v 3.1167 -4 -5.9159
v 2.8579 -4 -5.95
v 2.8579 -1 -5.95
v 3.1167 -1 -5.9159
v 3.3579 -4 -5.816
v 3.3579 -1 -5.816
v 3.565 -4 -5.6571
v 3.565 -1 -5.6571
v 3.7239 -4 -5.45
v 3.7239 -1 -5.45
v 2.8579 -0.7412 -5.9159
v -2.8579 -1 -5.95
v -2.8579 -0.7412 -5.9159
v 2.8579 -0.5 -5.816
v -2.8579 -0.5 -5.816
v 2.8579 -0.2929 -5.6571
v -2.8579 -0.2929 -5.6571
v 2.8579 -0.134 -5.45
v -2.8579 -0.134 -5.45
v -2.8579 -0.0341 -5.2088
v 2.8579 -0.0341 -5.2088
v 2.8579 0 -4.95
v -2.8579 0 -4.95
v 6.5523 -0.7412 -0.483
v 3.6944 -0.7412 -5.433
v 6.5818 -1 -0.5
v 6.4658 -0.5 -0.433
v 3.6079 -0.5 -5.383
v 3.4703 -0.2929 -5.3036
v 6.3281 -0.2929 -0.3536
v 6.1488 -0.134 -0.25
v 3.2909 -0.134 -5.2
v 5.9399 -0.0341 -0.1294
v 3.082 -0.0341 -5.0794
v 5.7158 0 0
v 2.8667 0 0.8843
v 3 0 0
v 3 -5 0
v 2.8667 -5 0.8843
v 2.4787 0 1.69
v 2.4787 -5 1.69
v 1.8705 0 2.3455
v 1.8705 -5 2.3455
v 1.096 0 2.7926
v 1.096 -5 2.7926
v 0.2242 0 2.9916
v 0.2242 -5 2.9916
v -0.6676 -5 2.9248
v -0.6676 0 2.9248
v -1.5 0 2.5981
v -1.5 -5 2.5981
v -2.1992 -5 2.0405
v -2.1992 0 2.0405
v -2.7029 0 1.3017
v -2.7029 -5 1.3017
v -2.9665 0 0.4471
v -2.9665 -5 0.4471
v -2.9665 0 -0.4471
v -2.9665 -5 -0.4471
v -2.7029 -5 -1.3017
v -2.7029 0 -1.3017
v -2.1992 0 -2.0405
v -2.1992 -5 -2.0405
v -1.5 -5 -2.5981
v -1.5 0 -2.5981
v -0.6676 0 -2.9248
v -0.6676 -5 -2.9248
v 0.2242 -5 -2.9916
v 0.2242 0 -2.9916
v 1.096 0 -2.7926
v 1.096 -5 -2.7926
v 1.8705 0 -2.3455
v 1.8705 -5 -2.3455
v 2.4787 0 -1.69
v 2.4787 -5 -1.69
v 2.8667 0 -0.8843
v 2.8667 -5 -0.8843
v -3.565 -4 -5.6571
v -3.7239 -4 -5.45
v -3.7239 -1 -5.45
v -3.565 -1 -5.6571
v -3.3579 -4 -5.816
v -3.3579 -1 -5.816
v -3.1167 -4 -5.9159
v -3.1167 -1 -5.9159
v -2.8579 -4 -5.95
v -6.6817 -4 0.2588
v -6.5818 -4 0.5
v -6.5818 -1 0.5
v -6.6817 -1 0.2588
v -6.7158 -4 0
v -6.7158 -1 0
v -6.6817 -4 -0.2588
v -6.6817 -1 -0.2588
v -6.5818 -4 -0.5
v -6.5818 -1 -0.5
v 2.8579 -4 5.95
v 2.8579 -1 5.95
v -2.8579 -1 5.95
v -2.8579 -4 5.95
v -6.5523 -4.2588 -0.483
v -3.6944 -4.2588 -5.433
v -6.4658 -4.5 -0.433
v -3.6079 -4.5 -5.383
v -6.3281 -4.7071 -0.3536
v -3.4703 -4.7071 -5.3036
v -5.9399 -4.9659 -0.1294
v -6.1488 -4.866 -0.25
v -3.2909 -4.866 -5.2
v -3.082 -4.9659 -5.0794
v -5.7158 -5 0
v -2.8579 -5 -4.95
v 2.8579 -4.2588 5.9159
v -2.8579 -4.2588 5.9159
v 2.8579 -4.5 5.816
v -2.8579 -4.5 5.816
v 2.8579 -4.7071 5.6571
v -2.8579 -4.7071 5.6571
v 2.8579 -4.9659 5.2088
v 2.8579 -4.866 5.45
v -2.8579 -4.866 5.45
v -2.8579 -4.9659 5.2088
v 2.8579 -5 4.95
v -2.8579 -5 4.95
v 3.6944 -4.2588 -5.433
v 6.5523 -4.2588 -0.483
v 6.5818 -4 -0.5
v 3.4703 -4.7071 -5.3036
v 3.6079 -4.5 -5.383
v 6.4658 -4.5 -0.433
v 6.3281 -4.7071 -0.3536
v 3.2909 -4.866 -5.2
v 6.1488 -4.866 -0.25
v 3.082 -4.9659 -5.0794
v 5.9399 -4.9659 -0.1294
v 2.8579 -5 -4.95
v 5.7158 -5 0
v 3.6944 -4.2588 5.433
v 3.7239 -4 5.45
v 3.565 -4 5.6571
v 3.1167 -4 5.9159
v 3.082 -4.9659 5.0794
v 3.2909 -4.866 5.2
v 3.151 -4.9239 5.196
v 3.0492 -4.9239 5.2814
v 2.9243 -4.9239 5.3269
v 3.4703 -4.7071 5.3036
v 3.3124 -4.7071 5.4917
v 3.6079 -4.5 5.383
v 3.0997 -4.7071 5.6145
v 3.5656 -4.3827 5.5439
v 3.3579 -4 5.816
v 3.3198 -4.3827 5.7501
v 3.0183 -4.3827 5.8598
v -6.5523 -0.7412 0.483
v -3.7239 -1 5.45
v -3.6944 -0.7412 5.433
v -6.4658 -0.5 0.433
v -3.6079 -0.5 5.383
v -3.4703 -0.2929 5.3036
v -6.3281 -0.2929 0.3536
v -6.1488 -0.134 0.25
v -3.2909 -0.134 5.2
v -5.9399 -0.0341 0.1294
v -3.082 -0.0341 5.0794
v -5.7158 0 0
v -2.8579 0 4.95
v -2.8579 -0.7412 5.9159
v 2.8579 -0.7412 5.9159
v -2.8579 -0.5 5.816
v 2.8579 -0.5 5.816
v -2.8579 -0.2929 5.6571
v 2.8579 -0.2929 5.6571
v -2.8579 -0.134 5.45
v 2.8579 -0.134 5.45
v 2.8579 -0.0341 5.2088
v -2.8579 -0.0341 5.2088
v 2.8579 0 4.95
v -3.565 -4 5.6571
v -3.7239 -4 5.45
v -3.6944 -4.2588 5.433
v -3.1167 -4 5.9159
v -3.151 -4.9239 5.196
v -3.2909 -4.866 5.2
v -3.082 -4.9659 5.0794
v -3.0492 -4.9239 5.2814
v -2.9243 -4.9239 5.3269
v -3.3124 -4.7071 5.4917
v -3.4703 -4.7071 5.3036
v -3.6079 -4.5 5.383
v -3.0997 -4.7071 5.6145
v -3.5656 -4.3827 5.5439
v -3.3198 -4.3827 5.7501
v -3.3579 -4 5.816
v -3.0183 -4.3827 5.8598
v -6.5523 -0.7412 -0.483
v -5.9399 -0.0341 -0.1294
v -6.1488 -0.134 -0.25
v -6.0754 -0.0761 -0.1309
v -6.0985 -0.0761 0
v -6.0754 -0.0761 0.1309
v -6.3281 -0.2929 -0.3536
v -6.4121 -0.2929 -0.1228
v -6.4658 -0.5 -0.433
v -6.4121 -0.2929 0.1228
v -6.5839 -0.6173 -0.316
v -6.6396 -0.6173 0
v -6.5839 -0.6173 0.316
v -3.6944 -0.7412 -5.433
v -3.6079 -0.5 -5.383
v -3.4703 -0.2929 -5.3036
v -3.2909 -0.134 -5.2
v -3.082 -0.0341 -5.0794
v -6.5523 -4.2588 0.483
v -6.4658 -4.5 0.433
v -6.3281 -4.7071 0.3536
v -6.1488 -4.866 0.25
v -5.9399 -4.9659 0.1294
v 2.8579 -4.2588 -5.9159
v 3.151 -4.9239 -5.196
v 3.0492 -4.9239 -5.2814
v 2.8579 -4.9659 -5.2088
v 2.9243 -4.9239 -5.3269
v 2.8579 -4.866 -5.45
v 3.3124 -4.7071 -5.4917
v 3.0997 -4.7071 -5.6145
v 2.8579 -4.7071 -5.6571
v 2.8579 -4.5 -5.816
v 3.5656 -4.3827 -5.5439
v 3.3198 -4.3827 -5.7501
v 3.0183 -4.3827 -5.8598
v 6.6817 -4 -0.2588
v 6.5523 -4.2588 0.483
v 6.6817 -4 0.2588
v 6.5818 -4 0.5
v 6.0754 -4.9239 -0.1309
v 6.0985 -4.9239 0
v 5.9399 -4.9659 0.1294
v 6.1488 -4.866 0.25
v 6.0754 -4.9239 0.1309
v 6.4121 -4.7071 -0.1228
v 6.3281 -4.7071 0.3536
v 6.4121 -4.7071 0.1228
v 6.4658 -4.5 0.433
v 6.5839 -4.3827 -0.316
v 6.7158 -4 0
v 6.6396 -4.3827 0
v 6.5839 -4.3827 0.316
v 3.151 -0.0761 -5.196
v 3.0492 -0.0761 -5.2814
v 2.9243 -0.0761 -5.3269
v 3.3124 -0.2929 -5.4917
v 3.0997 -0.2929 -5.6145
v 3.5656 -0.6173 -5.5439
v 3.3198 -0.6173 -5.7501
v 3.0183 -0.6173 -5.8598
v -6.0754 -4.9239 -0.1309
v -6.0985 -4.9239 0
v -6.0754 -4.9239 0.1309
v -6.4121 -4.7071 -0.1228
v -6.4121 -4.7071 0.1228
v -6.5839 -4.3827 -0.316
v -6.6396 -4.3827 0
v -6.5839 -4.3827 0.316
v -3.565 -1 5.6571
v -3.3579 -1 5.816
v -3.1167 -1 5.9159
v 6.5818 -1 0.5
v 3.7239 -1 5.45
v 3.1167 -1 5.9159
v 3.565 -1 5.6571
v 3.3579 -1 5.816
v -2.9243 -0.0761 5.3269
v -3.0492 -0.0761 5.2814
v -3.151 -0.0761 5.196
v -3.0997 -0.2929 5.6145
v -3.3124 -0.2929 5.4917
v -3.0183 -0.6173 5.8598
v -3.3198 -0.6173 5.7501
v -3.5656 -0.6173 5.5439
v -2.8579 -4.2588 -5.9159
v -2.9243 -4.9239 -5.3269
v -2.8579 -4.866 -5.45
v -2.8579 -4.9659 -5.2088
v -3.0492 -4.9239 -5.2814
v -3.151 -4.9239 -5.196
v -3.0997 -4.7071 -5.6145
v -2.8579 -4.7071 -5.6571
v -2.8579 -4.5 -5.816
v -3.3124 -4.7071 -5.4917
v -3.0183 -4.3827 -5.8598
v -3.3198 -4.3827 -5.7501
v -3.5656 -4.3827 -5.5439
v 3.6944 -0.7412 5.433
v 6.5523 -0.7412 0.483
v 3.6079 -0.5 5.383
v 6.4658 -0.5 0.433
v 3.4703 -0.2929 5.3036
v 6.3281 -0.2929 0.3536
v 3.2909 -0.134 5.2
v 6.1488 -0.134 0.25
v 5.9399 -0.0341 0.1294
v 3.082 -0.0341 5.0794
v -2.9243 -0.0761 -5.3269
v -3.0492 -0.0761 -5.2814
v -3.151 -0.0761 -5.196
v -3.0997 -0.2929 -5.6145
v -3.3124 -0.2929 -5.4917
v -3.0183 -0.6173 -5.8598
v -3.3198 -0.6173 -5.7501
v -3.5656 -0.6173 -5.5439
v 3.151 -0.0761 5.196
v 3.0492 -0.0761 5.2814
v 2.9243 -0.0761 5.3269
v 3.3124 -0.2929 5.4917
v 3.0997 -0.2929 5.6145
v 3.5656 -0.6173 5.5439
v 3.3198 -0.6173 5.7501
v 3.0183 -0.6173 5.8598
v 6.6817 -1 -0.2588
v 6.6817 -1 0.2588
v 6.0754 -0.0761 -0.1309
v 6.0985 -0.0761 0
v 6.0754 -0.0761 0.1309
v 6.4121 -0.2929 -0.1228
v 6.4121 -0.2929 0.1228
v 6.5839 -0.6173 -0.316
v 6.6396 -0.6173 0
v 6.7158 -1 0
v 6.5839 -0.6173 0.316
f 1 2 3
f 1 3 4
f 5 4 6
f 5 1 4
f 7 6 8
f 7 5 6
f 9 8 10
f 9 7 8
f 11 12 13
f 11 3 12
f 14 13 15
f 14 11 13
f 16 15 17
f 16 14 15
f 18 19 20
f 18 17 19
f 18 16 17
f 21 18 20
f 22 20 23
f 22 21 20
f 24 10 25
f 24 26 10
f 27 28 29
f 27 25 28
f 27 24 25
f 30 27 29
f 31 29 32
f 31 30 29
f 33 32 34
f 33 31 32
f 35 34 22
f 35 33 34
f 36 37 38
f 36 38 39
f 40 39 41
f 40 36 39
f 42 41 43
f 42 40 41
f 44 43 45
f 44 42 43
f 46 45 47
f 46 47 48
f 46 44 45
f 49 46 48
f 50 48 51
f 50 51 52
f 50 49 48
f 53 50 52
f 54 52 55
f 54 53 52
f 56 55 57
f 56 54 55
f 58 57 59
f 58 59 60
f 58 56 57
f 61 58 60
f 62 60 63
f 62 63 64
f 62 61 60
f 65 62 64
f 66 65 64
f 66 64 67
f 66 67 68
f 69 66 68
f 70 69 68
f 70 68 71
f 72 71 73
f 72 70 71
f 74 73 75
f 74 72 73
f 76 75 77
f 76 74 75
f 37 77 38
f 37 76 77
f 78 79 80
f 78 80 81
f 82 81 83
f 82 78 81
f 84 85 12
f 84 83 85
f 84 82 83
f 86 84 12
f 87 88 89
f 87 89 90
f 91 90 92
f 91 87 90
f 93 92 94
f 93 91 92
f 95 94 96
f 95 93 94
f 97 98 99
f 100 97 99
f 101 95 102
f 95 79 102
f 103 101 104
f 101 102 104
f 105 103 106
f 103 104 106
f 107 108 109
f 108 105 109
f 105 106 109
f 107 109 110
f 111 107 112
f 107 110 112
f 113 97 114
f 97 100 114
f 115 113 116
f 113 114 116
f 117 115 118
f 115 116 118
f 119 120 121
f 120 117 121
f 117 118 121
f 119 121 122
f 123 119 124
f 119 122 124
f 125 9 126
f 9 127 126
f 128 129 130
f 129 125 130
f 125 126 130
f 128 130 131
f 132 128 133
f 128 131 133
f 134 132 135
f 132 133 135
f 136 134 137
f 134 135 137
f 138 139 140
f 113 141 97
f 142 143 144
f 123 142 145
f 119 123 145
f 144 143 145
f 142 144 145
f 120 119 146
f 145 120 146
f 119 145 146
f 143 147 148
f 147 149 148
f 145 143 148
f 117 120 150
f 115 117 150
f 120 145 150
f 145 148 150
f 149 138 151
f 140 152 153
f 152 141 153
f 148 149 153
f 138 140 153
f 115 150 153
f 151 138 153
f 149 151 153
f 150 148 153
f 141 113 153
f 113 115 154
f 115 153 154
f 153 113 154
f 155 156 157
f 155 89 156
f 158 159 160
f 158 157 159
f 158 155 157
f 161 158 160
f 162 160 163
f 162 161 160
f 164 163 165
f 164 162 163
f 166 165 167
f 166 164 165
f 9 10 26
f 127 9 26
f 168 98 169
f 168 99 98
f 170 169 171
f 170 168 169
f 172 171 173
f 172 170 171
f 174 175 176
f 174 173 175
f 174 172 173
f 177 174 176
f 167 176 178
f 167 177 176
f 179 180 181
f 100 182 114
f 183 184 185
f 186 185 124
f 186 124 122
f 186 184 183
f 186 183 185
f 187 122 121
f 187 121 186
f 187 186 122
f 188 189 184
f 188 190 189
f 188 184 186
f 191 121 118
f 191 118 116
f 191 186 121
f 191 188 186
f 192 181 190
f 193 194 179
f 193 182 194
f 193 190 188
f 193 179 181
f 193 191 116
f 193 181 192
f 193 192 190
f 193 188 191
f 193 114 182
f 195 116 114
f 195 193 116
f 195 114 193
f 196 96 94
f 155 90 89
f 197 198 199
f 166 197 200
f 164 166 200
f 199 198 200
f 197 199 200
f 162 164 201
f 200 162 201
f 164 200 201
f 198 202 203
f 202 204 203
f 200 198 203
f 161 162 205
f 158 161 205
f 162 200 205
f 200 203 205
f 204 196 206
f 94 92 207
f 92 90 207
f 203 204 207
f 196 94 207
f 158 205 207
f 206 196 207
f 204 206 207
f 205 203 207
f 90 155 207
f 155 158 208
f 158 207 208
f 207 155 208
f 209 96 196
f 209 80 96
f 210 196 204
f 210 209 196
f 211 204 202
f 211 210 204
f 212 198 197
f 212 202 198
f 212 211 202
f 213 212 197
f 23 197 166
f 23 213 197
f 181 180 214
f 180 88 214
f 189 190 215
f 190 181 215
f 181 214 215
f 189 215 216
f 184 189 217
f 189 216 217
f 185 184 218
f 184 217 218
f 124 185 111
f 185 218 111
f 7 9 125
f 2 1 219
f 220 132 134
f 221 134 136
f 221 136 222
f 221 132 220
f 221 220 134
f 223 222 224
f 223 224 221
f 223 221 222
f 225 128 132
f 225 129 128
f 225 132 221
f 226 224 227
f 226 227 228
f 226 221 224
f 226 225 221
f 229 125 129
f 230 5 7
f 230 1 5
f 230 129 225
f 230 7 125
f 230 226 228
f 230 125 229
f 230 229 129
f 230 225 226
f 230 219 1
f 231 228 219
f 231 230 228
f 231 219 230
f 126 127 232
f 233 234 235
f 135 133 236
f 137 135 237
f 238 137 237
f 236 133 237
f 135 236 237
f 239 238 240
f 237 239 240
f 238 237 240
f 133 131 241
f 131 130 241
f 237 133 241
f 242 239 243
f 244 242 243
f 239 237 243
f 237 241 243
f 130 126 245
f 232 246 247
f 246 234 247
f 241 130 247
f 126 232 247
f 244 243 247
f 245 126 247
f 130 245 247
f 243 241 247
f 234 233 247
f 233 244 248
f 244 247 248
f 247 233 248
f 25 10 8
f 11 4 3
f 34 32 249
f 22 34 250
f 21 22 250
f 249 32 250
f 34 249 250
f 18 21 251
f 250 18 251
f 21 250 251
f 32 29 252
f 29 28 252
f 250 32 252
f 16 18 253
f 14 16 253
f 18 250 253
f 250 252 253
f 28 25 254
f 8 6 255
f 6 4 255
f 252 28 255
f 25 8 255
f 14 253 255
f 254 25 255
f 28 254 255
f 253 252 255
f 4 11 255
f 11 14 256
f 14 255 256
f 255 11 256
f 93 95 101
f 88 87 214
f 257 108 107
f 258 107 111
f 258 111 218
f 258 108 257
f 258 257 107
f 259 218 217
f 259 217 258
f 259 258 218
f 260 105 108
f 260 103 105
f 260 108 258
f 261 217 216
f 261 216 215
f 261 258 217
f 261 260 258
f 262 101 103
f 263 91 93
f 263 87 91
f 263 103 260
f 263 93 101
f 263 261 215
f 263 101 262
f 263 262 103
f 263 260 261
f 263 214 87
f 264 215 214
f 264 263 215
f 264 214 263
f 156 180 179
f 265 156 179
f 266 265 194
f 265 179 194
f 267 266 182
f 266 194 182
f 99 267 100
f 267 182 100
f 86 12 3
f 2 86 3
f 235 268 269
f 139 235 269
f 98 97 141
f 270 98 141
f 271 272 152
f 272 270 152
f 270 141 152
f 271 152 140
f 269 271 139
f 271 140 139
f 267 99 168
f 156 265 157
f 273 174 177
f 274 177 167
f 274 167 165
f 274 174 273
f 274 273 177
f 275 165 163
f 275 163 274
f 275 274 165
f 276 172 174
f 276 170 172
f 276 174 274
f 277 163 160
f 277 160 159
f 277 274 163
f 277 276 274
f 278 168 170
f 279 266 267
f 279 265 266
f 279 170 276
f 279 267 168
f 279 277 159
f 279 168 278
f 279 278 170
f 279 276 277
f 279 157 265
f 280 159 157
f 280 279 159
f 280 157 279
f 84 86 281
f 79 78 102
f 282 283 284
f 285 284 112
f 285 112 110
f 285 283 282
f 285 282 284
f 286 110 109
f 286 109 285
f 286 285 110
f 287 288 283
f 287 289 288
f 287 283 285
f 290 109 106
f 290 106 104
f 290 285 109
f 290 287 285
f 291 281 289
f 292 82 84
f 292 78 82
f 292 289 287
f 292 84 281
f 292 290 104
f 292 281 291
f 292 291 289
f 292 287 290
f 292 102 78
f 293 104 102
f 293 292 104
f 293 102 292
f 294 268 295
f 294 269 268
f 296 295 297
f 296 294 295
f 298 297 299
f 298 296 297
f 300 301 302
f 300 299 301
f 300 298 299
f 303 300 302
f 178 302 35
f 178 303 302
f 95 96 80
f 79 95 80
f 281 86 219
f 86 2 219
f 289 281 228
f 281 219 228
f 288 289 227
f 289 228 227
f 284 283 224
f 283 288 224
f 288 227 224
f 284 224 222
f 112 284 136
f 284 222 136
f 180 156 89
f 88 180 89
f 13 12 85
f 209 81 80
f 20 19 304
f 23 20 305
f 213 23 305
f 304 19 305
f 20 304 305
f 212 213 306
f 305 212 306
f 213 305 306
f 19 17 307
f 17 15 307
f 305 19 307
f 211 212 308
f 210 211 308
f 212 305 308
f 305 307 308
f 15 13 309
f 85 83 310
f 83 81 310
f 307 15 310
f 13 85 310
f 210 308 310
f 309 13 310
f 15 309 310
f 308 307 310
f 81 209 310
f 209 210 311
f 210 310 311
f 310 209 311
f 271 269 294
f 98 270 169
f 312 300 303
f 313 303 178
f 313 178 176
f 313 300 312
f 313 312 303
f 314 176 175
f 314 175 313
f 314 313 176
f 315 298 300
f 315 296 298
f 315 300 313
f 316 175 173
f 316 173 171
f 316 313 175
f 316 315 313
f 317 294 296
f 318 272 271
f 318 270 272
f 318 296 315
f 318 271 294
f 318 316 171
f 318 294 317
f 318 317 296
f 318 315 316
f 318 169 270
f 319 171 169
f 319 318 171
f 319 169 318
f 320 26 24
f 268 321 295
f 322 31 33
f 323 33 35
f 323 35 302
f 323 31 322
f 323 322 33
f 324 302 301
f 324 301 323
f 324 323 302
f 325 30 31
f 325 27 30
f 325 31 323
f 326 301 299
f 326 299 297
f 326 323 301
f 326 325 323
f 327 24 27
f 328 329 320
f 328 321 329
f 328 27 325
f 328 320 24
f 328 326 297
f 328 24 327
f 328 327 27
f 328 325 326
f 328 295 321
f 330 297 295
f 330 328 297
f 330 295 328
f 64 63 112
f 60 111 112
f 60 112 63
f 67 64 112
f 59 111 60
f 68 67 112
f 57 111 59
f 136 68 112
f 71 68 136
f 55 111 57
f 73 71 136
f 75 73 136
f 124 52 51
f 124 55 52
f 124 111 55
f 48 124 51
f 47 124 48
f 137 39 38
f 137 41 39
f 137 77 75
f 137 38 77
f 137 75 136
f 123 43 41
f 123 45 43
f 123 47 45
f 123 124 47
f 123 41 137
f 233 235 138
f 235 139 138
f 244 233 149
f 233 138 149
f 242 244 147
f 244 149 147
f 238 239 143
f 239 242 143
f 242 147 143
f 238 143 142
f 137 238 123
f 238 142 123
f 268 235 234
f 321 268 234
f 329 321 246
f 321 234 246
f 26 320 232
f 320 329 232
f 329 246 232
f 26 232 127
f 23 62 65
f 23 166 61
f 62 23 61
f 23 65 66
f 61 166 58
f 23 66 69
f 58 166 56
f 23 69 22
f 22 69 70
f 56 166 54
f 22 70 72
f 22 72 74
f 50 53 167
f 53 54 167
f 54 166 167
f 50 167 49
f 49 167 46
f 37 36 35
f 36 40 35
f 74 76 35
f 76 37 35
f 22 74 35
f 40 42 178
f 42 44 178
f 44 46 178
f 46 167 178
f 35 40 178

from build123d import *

# Parameters (mm, degrees)
F0_R     = 3
F1_DEPTH = 5
F2_R     = 1


# Not quite as in the source:
# - a feature names something its author has since deleted; it is built from what else it names


with BuildPart() as f1:
    # F0 (on Front) → F1 (new body)
    with BuildSketch(Plane.XZ):
        Polygon((-3.4352341017, 5.95), (-6.8704682034, 0), (-3.4352341017, -5.95), (3.4352341017, -5.95), (6.8704682034, 0), (3.4352341017, 5.95), align=None)
        Circle(F0_R, mode=Mode.SUBTRACT)
    extrude(amount=F1_DEPTH)

    # F2
    f2_edges = [f1.edges().sort_by_distance(p)[0] for p in [
        (-3.435234, -2.5, 5.95),
        (-6.870468, -2.5, 0),
        (-3.435234, -2.5, -5.95),
        (3.435234, -2.5, 5.95),
        (6.870468, -2.5, 0),
        (3.435234, -2.5, -5.95),
        (5.152851, -5, -2.975),
        (5.152851, 0, -2.975),
        (5.152851, 0, 2.975),
        (5.152851, -5, 2.975),
        (0, -5, -5.95),
        (0, 0, -5.95),
        (-5.152851, 0, -2.975),
        (-5.152851, -5, -2.975),
        (-5.152851, -5, 2.975),
        (0, -5, 5.95),
        (0, 0, 5.95),
        (-5.152851, 0, 2.975),
    ]]
    fillet(f2_edges, radius=F2_R)


solid = f1.part
